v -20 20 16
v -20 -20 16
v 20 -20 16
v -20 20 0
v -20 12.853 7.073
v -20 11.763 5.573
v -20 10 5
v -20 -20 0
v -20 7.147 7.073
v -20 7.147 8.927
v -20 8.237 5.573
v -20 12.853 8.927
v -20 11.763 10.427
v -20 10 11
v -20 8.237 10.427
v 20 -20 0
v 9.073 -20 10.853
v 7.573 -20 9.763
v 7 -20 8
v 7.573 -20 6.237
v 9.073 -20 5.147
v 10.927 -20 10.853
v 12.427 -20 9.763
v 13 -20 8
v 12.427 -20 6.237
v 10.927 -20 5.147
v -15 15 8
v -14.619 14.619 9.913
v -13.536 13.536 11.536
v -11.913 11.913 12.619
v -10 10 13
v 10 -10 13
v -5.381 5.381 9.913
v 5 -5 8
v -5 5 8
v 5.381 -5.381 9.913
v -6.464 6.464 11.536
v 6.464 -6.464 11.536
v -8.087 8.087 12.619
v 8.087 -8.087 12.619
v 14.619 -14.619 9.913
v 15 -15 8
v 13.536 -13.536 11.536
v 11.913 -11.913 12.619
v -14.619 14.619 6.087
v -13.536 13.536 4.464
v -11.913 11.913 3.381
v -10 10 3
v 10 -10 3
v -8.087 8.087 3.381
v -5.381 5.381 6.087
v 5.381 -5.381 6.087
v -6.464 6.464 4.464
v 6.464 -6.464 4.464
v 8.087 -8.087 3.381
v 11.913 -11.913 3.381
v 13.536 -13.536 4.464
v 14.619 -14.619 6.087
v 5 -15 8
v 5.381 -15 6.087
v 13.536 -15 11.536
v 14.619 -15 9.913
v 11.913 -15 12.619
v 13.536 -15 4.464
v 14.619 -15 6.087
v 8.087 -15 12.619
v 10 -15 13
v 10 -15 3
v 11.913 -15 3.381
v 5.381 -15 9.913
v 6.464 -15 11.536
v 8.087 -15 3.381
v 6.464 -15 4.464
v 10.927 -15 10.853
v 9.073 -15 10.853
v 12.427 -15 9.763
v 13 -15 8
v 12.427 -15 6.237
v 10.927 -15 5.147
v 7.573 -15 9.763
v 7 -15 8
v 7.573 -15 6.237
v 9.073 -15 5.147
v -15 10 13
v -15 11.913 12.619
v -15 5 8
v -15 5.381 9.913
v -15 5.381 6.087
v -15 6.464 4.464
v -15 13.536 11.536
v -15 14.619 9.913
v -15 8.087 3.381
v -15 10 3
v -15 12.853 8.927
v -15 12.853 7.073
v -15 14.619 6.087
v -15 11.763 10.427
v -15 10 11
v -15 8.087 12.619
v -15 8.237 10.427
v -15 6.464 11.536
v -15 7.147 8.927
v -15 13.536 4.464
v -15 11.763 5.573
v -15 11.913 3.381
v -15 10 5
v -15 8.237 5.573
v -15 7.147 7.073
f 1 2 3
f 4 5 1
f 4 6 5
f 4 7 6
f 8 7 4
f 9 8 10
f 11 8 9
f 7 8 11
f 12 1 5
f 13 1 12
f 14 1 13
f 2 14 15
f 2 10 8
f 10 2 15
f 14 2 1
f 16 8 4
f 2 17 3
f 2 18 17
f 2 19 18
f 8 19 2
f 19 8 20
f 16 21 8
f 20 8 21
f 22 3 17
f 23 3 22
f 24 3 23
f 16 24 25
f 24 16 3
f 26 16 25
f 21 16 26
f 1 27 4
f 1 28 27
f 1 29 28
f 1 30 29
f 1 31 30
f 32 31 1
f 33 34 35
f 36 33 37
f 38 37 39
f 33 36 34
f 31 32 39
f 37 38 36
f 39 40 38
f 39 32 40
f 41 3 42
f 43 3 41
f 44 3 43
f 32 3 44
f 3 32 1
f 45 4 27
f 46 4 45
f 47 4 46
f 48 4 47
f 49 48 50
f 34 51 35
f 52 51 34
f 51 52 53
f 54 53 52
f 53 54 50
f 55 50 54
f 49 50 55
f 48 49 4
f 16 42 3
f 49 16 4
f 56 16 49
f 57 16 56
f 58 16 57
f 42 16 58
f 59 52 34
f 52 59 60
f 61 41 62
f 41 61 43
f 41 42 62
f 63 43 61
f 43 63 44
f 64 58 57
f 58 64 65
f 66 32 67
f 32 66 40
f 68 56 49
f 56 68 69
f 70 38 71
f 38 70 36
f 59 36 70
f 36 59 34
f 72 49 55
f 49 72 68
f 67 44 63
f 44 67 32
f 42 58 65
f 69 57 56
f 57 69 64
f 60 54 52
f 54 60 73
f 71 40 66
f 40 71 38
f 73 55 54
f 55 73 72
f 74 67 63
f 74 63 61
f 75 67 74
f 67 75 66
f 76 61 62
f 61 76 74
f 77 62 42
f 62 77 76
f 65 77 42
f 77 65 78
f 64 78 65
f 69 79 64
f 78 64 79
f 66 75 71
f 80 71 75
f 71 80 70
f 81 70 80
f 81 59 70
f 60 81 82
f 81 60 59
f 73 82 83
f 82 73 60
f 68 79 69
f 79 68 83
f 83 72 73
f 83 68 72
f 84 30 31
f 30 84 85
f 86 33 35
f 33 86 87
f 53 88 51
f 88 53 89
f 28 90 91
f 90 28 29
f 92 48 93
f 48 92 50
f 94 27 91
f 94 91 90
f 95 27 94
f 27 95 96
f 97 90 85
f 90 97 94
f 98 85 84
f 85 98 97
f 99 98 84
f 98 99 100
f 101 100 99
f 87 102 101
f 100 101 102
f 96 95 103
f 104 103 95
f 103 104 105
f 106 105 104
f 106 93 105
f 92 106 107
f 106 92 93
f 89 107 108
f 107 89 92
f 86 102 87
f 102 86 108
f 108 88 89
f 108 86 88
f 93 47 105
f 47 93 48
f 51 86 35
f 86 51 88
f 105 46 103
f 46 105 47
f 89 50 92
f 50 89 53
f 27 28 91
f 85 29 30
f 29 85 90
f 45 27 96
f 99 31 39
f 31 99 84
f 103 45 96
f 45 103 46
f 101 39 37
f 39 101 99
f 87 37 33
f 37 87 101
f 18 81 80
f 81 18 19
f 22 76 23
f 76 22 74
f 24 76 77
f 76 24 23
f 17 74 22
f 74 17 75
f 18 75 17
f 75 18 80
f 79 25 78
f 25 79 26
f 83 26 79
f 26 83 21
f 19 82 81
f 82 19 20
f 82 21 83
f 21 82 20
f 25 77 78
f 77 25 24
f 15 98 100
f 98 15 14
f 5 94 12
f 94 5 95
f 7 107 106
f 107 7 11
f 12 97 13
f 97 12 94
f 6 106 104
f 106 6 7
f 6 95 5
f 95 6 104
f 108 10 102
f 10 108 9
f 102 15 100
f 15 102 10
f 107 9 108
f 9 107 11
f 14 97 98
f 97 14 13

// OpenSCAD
w_h = 16;

difference() {

    rotate(-45)
    difference() {
        rotate(45)
        translate([-20, -20])
        cube([40, 40, w_h]);

        c = sqrt(pow(40, 2) + pow(40, 2));
        translate([-c/2, 0, -1])
        cube([c, c, w_h + 2]);
    }

    translate([10, 0, w_h / 2])
    rotate([90, 0, 0])
    cylinder(r1 = 5, r2 = 5, h = 15);

    translate([-15, 10, w_h / 2])
    rotate([0, 90, 0])
    cylinder(r1 = 5, r2 = 5, h = 15);

    translate([10, 0, w_h / 2])
    rotate([90, 0, 0])
    cylinder(r1 = 3, r2 = 3, h = 25);

    translate([-25, 10, w_h / 2])
    rotate([0, 90, 0])
    cylinder(r1 = 3, r2 = 3, h = 25);

}
